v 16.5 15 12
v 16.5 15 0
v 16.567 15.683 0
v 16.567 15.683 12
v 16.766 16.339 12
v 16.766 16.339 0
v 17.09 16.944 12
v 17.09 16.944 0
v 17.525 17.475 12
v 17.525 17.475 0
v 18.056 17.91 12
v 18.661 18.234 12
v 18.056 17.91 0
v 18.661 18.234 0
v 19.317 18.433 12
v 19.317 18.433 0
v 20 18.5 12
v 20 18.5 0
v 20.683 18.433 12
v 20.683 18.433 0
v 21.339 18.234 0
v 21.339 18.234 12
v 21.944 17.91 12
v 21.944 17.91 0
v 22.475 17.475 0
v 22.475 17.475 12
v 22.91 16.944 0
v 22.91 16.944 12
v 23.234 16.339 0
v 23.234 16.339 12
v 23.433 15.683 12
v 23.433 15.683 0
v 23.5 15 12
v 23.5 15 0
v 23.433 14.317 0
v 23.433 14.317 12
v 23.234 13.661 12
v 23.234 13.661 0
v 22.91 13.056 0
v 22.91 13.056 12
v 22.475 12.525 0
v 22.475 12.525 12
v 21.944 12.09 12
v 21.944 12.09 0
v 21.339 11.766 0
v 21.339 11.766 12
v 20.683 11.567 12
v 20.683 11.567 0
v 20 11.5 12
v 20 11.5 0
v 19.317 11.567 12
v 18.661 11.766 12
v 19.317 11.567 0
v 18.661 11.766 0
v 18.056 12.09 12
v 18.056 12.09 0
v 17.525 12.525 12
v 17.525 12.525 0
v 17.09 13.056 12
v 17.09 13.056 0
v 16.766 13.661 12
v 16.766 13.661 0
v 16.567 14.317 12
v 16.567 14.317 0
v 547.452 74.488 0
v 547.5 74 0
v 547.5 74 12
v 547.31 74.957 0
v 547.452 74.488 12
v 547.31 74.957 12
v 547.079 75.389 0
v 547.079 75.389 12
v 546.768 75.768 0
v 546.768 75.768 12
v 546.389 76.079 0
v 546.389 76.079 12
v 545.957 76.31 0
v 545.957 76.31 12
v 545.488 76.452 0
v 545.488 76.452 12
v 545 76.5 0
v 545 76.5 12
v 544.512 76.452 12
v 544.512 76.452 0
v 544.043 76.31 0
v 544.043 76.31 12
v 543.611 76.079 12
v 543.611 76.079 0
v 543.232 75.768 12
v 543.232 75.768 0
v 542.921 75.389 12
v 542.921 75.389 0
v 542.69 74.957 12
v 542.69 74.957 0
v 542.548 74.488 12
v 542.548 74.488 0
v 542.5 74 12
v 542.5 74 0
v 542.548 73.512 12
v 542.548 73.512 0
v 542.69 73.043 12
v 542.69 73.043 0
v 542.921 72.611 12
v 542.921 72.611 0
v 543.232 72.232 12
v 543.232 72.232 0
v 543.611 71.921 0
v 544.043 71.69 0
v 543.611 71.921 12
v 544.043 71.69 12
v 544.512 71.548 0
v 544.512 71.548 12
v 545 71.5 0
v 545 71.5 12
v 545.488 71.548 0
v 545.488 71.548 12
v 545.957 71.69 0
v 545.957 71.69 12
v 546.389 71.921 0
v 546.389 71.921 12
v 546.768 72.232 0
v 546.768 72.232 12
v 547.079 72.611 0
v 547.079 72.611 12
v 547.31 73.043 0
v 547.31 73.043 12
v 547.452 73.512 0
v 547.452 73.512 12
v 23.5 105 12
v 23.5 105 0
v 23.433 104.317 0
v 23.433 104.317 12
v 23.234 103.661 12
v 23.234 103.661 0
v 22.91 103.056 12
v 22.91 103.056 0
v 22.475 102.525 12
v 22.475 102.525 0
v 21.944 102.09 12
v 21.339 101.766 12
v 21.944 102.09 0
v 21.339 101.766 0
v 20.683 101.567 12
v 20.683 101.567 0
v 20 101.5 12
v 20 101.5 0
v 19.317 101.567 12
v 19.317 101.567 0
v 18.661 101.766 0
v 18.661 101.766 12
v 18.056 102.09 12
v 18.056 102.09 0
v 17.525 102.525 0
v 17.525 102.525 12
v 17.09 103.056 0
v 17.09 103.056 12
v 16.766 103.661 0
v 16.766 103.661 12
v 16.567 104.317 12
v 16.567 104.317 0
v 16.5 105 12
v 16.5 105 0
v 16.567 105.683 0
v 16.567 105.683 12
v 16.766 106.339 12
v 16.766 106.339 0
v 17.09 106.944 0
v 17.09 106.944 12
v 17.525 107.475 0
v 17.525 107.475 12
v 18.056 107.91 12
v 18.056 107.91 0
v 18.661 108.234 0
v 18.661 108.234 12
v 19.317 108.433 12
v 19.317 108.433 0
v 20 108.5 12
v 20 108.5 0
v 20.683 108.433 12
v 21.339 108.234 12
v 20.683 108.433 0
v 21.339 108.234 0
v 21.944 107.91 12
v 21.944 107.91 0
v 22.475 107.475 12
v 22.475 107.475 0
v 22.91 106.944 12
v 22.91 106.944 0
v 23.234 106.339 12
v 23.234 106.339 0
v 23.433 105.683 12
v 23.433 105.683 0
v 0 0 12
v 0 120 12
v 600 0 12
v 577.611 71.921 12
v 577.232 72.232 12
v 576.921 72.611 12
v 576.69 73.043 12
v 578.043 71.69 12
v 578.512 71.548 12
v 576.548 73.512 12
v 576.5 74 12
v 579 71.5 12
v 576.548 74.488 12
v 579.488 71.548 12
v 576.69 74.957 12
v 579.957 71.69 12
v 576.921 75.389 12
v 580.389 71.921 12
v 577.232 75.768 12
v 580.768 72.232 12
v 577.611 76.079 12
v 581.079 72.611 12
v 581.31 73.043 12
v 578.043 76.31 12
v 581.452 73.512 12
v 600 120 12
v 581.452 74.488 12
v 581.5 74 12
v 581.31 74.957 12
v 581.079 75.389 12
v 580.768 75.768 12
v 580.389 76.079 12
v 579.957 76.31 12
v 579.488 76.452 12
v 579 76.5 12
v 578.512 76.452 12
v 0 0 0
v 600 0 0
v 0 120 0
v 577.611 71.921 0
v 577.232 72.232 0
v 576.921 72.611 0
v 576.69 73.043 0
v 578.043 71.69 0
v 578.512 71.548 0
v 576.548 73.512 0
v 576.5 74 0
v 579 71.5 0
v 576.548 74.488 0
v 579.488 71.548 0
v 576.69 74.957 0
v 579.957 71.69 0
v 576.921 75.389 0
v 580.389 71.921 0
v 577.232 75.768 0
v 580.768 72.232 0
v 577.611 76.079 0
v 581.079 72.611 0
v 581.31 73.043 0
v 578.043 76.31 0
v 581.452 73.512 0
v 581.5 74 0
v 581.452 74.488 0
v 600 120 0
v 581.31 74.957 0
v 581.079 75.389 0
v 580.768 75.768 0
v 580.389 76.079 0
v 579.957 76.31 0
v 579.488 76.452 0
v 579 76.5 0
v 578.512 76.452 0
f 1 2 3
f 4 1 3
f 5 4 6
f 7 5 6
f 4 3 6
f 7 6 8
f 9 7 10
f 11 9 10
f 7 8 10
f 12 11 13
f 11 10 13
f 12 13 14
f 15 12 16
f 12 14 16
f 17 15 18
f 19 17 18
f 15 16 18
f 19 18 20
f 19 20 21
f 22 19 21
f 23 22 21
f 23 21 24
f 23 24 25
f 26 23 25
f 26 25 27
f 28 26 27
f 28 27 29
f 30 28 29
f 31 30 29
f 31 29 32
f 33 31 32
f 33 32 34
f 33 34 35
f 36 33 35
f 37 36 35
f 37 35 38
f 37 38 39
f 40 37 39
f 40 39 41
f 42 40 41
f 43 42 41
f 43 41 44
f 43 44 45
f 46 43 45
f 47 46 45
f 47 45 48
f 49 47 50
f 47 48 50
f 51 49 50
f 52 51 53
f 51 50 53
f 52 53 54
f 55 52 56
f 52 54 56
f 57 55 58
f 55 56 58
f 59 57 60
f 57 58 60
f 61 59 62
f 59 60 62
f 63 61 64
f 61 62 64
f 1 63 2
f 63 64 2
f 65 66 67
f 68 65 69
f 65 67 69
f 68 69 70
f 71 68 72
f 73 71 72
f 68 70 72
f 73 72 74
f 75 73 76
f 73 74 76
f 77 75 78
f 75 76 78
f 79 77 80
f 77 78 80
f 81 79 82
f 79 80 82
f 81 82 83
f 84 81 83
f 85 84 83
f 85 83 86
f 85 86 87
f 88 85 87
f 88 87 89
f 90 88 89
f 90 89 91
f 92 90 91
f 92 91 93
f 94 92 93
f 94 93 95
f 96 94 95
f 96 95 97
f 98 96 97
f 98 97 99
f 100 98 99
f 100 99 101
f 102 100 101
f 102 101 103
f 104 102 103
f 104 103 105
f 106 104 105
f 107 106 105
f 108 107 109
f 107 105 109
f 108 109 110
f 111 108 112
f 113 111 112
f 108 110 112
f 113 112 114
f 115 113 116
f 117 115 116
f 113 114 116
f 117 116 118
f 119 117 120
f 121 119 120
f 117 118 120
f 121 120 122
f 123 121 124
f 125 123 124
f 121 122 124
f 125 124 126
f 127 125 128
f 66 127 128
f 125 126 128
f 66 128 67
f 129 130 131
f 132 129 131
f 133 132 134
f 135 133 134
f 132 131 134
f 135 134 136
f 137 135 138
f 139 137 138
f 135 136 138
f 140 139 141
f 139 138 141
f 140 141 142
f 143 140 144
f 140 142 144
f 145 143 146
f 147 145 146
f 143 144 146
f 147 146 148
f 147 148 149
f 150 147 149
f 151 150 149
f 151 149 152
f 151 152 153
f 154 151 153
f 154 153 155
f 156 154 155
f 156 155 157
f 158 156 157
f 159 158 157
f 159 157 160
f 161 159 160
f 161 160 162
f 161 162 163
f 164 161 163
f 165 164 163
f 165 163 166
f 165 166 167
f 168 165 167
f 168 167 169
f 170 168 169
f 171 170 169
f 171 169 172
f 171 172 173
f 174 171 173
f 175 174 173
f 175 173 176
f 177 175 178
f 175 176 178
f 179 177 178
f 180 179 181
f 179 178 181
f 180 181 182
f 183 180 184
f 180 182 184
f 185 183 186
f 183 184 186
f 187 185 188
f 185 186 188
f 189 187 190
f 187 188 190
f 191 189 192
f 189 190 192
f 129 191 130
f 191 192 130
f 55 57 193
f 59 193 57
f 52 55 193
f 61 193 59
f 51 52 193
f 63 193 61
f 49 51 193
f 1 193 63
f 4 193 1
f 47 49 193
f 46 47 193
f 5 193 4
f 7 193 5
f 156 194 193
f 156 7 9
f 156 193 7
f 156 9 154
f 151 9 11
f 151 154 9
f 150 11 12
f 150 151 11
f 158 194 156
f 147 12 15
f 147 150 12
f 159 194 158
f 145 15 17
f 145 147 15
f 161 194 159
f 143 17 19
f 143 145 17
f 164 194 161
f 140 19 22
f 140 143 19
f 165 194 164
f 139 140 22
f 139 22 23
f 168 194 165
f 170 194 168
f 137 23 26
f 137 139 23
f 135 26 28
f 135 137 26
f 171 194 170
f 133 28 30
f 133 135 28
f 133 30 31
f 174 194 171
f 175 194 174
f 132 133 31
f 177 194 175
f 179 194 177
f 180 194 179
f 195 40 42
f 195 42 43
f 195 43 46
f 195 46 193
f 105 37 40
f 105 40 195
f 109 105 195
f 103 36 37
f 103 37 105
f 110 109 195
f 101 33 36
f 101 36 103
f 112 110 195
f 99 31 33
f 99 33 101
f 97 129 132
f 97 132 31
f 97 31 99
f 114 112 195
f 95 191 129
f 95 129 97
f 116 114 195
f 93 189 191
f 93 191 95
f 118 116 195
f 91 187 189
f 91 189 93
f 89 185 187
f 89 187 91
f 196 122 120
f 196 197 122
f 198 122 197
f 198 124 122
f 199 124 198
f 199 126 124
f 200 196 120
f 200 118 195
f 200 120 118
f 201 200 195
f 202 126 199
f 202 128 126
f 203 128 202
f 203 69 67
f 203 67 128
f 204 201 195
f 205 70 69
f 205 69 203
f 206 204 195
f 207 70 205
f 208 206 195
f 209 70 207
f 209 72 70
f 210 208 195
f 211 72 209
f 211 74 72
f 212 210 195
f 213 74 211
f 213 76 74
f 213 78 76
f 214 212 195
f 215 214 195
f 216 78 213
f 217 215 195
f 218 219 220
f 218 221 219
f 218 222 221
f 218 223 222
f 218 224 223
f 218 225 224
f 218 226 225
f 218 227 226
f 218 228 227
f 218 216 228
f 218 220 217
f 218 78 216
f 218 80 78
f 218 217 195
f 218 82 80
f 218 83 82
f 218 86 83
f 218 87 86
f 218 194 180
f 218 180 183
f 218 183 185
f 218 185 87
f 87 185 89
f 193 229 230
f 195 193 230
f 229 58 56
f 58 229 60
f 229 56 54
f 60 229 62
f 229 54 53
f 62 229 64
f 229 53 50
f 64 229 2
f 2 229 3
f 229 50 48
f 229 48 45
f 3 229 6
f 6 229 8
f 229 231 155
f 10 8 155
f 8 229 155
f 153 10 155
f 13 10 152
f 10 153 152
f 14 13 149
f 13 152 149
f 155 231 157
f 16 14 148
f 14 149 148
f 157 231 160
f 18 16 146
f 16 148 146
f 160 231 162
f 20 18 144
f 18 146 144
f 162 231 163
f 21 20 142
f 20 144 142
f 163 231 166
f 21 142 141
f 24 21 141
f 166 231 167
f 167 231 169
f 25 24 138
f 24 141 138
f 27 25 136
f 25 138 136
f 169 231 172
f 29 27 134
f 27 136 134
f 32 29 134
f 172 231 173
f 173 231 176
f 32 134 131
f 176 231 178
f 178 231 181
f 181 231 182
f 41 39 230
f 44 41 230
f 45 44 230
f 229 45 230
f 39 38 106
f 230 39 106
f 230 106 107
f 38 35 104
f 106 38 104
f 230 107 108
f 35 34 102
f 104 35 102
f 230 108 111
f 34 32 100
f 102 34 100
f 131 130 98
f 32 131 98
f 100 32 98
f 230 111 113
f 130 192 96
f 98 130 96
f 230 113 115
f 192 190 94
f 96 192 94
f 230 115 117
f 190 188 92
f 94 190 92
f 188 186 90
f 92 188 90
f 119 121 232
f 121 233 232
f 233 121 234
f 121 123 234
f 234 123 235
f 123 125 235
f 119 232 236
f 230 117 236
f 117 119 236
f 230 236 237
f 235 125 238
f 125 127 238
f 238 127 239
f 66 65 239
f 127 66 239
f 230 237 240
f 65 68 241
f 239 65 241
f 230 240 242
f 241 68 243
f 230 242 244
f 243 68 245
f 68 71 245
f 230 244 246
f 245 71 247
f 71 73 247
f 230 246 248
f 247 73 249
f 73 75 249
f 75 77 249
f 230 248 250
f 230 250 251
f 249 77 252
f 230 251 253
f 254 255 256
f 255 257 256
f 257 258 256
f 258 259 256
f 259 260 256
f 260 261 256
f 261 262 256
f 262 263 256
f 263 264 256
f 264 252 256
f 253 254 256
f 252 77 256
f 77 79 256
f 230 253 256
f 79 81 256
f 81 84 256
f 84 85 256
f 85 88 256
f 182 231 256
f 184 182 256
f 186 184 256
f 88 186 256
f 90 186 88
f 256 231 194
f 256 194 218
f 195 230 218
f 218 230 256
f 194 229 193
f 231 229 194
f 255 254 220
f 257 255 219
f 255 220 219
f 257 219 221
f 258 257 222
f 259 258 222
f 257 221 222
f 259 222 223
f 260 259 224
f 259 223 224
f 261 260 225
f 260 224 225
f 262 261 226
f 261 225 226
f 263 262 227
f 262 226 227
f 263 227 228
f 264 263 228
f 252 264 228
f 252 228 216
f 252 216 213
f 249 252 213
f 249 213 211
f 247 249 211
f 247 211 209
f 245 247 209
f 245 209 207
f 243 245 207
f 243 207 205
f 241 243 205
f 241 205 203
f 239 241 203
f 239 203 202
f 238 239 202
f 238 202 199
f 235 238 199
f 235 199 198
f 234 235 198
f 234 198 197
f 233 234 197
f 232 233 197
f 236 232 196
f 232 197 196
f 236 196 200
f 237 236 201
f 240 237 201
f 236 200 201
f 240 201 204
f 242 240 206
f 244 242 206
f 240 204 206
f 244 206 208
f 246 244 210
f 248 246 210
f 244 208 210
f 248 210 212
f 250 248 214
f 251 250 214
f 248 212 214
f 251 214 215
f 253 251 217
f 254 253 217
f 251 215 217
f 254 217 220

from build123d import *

# Parameters (mm, degrees)
SKETCH_1_W          = 600
SKETCH_1_H          = 120
EXTRUDE_1_DEPTH     = 12
SKETCH_4_R          = 3.5
CUT_EXTRUDE_1_DEPTH = 613
HOLE_WIZARD_M6_1_D  = 5


with BuildPart() as part:
    # 草图1 → 凸台-拉伸1 (new body)
    with BuildSketch(Plane.XY):
        with Locations((300, 60)):
            Rectangle(SKETCH_1_W, SKETCH_1_H)
    extrude(amount=EXTRUDE_1_DEPTH)

    # 草图4 → 切除-拉伸1 (cut, through all)
    with BuildSketch(Plane(origin=(0, 0, 0), x_dir=(-1, 0, 0), z_dir=(0, 0, -1))):
        with Locations((-20, 15)):
            Circle(SKETCH_4_R)
        with Locations(Location((-20, 105, 0), (0, 0, 180))):
            Circle(SKETCH_4_R)
    extrude(amount=-CUT_EXTRUDE_1_DEPTH, mode=Mode.SUBTRACT)

    # M6 螺纹孔1 (through all)
    with Locations(Plane(origin=(0, 0, 0), x_dir=(-1, 0, 0), z_dir=(0, 0, -1))):
        with Locations((-579, 74), (-545, 74)):
            Hole(HOLE_WIZARD_M6_1_D / 2)


solid = part.part
